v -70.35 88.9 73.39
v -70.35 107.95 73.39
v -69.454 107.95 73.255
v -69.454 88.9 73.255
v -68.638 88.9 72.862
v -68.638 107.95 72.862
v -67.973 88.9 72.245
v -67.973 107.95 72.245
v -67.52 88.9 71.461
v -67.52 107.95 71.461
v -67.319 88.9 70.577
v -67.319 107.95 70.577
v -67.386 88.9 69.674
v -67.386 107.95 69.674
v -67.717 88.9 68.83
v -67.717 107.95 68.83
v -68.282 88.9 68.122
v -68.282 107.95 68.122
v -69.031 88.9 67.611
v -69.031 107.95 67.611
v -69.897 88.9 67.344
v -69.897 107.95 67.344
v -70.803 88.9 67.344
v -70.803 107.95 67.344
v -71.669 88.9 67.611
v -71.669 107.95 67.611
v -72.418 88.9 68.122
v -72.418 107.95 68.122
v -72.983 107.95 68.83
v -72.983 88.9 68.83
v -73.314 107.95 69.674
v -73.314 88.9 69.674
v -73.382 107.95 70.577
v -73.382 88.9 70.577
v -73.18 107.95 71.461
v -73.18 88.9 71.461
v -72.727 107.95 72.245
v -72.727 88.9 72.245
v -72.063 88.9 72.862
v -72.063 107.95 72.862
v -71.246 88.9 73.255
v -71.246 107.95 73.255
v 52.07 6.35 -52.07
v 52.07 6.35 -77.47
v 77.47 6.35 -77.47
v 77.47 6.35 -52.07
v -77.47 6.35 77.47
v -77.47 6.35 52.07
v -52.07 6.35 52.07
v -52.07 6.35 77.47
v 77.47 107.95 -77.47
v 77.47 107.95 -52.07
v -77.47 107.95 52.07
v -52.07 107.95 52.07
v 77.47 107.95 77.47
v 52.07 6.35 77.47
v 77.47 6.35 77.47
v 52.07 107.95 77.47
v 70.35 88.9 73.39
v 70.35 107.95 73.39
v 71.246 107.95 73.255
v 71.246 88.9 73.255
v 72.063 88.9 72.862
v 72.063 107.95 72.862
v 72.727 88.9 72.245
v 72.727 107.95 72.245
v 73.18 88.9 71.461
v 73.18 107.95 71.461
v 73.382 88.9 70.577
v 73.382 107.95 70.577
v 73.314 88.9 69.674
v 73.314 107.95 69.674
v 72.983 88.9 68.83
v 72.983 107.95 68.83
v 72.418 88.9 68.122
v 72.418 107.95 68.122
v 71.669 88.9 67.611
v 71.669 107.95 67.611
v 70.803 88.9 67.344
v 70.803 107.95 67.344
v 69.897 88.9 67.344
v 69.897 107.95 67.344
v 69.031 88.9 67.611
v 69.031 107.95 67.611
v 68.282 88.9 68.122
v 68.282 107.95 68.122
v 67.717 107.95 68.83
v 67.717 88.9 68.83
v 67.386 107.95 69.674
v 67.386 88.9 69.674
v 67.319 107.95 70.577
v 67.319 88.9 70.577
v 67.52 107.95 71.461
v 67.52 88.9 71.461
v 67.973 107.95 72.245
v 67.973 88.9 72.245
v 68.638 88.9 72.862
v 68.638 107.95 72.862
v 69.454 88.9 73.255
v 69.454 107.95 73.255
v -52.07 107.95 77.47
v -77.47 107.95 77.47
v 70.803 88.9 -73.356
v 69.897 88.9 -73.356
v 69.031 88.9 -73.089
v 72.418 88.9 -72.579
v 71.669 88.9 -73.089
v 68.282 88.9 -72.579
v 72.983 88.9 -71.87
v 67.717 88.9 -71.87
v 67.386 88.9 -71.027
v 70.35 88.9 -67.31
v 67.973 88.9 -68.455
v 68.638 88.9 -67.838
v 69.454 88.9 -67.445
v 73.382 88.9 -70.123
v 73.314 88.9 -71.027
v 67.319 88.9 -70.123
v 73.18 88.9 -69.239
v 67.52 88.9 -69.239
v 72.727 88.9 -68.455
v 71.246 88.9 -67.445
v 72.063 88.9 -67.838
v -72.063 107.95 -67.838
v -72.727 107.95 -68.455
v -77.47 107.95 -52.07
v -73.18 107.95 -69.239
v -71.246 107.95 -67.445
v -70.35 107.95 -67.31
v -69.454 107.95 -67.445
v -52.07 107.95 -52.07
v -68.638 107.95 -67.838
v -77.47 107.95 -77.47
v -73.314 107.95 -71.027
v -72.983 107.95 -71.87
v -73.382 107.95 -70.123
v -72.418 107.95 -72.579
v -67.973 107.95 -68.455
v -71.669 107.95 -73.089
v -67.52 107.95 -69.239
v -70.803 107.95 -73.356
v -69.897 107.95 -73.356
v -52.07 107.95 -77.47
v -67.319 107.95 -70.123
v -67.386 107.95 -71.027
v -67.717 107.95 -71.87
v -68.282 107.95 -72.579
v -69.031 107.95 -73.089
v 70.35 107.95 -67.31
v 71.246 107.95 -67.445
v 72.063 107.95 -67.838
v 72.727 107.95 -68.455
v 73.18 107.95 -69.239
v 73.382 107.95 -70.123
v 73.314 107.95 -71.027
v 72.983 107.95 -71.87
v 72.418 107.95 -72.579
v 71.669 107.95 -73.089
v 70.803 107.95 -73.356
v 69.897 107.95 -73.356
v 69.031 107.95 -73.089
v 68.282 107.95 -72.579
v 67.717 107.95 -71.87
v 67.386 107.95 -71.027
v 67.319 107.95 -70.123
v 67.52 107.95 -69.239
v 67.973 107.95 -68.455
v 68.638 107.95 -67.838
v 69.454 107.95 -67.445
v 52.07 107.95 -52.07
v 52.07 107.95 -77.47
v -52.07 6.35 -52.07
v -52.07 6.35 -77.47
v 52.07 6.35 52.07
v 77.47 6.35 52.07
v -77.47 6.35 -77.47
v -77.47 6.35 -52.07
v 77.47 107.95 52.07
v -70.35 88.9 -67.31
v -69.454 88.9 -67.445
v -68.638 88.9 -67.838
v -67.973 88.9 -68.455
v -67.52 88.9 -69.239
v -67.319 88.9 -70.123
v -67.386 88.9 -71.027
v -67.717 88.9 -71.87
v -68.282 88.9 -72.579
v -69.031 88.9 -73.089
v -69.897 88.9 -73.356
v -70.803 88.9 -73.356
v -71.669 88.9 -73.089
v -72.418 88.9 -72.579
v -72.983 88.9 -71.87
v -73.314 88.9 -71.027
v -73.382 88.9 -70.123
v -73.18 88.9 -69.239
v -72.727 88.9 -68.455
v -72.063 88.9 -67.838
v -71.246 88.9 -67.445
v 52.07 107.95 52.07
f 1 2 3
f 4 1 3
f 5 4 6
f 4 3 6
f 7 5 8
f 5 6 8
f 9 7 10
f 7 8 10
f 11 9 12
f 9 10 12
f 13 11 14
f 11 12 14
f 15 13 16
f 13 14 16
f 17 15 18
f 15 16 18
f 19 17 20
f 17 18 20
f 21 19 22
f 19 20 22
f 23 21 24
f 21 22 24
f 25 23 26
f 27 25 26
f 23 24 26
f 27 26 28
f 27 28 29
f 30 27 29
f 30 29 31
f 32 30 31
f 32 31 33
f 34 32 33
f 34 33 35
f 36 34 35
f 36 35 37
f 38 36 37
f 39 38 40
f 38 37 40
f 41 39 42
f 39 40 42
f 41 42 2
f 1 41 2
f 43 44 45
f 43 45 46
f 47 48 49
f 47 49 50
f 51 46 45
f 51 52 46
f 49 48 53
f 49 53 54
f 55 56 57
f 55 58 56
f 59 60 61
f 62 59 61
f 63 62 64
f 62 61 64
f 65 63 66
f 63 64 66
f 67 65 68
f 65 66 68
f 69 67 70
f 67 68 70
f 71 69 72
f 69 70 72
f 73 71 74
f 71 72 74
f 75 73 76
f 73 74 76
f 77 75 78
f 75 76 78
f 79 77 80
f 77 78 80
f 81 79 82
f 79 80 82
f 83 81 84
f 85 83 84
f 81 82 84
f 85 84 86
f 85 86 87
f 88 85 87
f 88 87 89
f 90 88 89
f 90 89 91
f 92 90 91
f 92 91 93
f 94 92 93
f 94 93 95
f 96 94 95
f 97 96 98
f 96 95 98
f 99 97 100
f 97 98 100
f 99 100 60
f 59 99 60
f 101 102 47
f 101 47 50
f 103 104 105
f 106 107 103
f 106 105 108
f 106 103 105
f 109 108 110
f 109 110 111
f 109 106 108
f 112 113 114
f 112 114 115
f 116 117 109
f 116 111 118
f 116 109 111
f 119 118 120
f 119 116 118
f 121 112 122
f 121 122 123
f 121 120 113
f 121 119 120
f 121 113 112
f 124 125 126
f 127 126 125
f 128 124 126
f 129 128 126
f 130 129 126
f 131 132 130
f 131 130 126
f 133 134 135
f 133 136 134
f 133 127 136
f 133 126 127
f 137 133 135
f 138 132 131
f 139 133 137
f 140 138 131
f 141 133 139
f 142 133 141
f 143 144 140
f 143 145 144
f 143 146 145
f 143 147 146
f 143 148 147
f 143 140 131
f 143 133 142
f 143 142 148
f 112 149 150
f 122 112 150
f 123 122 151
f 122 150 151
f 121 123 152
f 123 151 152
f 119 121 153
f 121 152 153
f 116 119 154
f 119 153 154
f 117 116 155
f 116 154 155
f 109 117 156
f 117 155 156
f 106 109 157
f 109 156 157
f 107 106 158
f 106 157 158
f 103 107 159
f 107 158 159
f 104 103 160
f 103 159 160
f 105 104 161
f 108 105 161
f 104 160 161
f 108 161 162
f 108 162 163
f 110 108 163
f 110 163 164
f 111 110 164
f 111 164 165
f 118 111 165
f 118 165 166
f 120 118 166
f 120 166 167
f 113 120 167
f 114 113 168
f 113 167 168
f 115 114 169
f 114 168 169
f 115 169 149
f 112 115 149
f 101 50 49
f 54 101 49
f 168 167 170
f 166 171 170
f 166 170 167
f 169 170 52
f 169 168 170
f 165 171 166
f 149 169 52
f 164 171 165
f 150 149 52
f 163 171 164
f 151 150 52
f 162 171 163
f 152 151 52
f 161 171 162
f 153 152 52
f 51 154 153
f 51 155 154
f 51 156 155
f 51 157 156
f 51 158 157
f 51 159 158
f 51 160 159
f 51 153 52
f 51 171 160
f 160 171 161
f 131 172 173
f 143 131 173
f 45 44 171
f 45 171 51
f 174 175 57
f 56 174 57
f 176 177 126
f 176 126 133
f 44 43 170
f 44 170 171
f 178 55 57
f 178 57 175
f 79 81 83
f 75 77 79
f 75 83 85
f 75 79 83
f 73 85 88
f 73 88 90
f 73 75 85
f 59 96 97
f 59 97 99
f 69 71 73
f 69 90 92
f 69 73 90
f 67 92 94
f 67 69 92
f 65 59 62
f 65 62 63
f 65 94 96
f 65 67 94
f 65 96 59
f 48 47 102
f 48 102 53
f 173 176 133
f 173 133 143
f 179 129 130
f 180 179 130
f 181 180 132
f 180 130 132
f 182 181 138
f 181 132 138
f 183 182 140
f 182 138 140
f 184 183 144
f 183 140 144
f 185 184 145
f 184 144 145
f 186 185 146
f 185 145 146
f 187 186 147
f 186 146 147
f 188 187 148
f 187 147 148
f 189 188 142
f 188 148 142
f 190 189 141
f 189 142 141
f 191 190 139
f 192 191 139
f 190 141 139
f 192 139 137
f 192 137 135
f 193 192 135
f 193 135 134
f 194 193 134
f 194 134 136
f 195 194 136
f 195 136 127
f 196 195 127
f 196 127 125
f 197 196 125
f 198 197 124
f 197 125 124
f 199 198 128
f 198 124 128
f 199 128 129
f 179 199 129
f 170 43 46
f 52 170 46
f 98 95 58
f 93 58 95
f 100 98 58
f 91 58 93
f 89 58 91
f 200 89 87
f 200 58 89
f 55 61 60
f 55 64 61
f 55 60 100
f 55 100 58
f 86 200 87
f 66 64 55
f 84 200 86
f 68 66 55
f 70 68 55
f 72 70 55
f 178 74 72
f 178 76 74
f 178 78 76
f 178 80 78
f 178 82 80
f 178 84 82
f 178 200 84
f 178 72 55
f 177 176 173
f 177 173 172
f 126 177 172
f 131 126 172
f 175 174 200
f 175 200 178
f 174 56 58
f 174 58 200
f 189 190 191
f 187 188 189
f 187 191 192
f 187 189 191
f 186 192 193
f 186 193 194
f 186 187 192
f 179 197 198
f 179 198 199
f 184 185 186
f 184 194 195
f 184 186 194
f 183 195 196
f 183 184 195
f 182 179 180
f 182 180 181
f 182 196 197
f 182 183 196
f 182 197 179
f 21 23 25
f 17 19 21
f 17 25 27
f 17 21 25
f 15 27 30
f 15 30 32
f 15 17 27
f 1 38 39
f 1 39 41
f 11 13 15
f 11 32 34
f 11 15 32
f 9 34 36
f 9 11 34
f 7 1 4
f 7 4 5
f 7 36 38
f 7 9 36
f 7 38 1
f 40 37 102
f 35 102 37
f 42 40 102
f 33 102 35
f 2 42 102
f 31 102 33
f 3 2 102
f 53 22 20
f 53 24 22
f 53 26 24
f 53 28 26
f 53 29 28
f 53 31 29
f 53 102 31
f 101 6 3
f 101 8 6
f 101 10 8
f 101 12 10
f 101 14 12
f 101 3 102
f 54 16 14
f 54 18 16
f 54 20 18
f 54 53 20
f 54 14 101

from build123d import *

# Parameters (mm, degrees)
SKETCH3_W               = 154.94
SKETCH3_H               = 154.94
BOSS_EXTRUDE3_DEPTH     = 6.35
SKETCH4_W               = 25.4
SKETCH4_H               = 25.4
BOSS_EXTRUDE4_DEPTH     = 101.6
SKETCH5_R               = 3.04
CUT_EXTRUDE1_DEPTH      = 19.05
CUT_EXTRUDE2_DEPTH      = 154.806385758
CUT_EXTRUDE2_DEPTH_BACK = 154.806385758


with BuildPart() as part:
    # Sketch3 → Boss-Extrude3 (new, symmetric)
    with BuildSketch(Plane(origin=(0, 0, 0), x_dir=(1, 0, 0), z_dir=(0, 1, 0))):
        Rectangle(SKETCH3_W, SKETCH3_H)
    extrude(amount=BOSS_EXTRUDE3_DEPTH, both=True)

    # Sketch4 → Boss-Extrude4 (add)
    with BuildSketch(Plane(origin=(0, 6.35, 0), x_dir=(1, 0, 0), z_dir=(0, 1, 0))):
        with Locations((-64.77, 64.77)):
            Rectangle(SKETCH4_W, SKETCH4_H)
        with Locations((64.77, 64.77)):
            Rectangle(SKETCH4_W, SKETCH4_H)
        with Locations((64.77, -64.77)):
            Rectangle(SKETCH4_W, SKETCH4_H)
        with Locations((-64.77, -64.77)):
            Rectangle(SKETCH4_W, SKETCH4_H)
    extrude(amount=BOSS_EXTRUDE4_DEPTH)

    # Sketch5 → Cut-Extrude1 (cut)
    with BuildSketch(Plane(origin=(0, 107.95, 0), x_dir=(1, 0, 0), z_dir=(0, 1, 0))):
        with Locations(Location((70.35005366, 70.35005366, 0), (0, 0, 270))):
            Circle(SKETCH5_R)
        with Locations(Location((-70.35005366, 70.35005366, 0), (0, 0, 270))):
            Circle(SKETCH5_R)
        with Locations(Location((-70.35005366, -70.35005366, 0), (0, 0, 270))):
            Circle(SKETCH5_R)
        with Locations(Location((70.35005366, -70.35005366, 0), (0, 0, 270))):
            Circle(SKETCH5_R)
    extrude(amount=-CUT_EXTRUDE1_DEPTH, mode=Mode.SUBTRACT)

    # Sketch6 → Cut-Extrude2 (cut, two sides: drawn at the far end of the back side and taken through both)
    with BuildSketch(Plane(origin=(0, 0, 0), x_dir=(0, 0, -1), z_dir=(1, 0, 0)).offset(-CUT_EXTRUDE2_DEPTH_BACK)):
        Polygon((-52.07, 6.35), (-77.47, 6.35), (-77.47, -6.35), (77.47, -6.35), (77.47, 6.35), (52.07, 6.35), align=None)
    extrude(amount=CUT_EXTRUDE2_DEPTH + CUT_EXTRUDE2_DEPTH_BACK, mode=Mode.SUBTRACT)


with BuildPart() as cut_extrude2_piece_1:
    # of the separate pieces the step leaves, piece 1, a body of its own (cut_extrude2_pieces)
    add(part.part.solids().sort_by_distance((-77.47, 107.95, -77.47))[0])


with BuildPart() as cut_extrude2_piece_2:
    # of the separate pieces the step leaves, piece 2, a body of its own (cut_extrude2_pieces)
    add(part.part.solids().sort_by_distance((52.07, 6.35, -77.47))[0])


with BuildPart() as cut_extrude2_piece_3:
    # of the separate pieces the step leaves, piece 3, a body of its own (cut_extrude2_pieces)
    add(part.part.solids().sort_by_distance((-77.47, 107.95, 77.47))[0])


with BuildPart() as cut_extrude2_piece_4:
    # of the separate pieces the step leaves, piece 4, a body of its own (cut_extrude2_pieces)
    add(part.part.solids().sort_by_distance((52.07, 6.35, 77.47))[0])


solid = Compound([cut_extrude2_piece_1.part, cut_extrude2_piece_2.part, cut_extrude2_piece_3.part, cut_extrude2_piece_4.part])
